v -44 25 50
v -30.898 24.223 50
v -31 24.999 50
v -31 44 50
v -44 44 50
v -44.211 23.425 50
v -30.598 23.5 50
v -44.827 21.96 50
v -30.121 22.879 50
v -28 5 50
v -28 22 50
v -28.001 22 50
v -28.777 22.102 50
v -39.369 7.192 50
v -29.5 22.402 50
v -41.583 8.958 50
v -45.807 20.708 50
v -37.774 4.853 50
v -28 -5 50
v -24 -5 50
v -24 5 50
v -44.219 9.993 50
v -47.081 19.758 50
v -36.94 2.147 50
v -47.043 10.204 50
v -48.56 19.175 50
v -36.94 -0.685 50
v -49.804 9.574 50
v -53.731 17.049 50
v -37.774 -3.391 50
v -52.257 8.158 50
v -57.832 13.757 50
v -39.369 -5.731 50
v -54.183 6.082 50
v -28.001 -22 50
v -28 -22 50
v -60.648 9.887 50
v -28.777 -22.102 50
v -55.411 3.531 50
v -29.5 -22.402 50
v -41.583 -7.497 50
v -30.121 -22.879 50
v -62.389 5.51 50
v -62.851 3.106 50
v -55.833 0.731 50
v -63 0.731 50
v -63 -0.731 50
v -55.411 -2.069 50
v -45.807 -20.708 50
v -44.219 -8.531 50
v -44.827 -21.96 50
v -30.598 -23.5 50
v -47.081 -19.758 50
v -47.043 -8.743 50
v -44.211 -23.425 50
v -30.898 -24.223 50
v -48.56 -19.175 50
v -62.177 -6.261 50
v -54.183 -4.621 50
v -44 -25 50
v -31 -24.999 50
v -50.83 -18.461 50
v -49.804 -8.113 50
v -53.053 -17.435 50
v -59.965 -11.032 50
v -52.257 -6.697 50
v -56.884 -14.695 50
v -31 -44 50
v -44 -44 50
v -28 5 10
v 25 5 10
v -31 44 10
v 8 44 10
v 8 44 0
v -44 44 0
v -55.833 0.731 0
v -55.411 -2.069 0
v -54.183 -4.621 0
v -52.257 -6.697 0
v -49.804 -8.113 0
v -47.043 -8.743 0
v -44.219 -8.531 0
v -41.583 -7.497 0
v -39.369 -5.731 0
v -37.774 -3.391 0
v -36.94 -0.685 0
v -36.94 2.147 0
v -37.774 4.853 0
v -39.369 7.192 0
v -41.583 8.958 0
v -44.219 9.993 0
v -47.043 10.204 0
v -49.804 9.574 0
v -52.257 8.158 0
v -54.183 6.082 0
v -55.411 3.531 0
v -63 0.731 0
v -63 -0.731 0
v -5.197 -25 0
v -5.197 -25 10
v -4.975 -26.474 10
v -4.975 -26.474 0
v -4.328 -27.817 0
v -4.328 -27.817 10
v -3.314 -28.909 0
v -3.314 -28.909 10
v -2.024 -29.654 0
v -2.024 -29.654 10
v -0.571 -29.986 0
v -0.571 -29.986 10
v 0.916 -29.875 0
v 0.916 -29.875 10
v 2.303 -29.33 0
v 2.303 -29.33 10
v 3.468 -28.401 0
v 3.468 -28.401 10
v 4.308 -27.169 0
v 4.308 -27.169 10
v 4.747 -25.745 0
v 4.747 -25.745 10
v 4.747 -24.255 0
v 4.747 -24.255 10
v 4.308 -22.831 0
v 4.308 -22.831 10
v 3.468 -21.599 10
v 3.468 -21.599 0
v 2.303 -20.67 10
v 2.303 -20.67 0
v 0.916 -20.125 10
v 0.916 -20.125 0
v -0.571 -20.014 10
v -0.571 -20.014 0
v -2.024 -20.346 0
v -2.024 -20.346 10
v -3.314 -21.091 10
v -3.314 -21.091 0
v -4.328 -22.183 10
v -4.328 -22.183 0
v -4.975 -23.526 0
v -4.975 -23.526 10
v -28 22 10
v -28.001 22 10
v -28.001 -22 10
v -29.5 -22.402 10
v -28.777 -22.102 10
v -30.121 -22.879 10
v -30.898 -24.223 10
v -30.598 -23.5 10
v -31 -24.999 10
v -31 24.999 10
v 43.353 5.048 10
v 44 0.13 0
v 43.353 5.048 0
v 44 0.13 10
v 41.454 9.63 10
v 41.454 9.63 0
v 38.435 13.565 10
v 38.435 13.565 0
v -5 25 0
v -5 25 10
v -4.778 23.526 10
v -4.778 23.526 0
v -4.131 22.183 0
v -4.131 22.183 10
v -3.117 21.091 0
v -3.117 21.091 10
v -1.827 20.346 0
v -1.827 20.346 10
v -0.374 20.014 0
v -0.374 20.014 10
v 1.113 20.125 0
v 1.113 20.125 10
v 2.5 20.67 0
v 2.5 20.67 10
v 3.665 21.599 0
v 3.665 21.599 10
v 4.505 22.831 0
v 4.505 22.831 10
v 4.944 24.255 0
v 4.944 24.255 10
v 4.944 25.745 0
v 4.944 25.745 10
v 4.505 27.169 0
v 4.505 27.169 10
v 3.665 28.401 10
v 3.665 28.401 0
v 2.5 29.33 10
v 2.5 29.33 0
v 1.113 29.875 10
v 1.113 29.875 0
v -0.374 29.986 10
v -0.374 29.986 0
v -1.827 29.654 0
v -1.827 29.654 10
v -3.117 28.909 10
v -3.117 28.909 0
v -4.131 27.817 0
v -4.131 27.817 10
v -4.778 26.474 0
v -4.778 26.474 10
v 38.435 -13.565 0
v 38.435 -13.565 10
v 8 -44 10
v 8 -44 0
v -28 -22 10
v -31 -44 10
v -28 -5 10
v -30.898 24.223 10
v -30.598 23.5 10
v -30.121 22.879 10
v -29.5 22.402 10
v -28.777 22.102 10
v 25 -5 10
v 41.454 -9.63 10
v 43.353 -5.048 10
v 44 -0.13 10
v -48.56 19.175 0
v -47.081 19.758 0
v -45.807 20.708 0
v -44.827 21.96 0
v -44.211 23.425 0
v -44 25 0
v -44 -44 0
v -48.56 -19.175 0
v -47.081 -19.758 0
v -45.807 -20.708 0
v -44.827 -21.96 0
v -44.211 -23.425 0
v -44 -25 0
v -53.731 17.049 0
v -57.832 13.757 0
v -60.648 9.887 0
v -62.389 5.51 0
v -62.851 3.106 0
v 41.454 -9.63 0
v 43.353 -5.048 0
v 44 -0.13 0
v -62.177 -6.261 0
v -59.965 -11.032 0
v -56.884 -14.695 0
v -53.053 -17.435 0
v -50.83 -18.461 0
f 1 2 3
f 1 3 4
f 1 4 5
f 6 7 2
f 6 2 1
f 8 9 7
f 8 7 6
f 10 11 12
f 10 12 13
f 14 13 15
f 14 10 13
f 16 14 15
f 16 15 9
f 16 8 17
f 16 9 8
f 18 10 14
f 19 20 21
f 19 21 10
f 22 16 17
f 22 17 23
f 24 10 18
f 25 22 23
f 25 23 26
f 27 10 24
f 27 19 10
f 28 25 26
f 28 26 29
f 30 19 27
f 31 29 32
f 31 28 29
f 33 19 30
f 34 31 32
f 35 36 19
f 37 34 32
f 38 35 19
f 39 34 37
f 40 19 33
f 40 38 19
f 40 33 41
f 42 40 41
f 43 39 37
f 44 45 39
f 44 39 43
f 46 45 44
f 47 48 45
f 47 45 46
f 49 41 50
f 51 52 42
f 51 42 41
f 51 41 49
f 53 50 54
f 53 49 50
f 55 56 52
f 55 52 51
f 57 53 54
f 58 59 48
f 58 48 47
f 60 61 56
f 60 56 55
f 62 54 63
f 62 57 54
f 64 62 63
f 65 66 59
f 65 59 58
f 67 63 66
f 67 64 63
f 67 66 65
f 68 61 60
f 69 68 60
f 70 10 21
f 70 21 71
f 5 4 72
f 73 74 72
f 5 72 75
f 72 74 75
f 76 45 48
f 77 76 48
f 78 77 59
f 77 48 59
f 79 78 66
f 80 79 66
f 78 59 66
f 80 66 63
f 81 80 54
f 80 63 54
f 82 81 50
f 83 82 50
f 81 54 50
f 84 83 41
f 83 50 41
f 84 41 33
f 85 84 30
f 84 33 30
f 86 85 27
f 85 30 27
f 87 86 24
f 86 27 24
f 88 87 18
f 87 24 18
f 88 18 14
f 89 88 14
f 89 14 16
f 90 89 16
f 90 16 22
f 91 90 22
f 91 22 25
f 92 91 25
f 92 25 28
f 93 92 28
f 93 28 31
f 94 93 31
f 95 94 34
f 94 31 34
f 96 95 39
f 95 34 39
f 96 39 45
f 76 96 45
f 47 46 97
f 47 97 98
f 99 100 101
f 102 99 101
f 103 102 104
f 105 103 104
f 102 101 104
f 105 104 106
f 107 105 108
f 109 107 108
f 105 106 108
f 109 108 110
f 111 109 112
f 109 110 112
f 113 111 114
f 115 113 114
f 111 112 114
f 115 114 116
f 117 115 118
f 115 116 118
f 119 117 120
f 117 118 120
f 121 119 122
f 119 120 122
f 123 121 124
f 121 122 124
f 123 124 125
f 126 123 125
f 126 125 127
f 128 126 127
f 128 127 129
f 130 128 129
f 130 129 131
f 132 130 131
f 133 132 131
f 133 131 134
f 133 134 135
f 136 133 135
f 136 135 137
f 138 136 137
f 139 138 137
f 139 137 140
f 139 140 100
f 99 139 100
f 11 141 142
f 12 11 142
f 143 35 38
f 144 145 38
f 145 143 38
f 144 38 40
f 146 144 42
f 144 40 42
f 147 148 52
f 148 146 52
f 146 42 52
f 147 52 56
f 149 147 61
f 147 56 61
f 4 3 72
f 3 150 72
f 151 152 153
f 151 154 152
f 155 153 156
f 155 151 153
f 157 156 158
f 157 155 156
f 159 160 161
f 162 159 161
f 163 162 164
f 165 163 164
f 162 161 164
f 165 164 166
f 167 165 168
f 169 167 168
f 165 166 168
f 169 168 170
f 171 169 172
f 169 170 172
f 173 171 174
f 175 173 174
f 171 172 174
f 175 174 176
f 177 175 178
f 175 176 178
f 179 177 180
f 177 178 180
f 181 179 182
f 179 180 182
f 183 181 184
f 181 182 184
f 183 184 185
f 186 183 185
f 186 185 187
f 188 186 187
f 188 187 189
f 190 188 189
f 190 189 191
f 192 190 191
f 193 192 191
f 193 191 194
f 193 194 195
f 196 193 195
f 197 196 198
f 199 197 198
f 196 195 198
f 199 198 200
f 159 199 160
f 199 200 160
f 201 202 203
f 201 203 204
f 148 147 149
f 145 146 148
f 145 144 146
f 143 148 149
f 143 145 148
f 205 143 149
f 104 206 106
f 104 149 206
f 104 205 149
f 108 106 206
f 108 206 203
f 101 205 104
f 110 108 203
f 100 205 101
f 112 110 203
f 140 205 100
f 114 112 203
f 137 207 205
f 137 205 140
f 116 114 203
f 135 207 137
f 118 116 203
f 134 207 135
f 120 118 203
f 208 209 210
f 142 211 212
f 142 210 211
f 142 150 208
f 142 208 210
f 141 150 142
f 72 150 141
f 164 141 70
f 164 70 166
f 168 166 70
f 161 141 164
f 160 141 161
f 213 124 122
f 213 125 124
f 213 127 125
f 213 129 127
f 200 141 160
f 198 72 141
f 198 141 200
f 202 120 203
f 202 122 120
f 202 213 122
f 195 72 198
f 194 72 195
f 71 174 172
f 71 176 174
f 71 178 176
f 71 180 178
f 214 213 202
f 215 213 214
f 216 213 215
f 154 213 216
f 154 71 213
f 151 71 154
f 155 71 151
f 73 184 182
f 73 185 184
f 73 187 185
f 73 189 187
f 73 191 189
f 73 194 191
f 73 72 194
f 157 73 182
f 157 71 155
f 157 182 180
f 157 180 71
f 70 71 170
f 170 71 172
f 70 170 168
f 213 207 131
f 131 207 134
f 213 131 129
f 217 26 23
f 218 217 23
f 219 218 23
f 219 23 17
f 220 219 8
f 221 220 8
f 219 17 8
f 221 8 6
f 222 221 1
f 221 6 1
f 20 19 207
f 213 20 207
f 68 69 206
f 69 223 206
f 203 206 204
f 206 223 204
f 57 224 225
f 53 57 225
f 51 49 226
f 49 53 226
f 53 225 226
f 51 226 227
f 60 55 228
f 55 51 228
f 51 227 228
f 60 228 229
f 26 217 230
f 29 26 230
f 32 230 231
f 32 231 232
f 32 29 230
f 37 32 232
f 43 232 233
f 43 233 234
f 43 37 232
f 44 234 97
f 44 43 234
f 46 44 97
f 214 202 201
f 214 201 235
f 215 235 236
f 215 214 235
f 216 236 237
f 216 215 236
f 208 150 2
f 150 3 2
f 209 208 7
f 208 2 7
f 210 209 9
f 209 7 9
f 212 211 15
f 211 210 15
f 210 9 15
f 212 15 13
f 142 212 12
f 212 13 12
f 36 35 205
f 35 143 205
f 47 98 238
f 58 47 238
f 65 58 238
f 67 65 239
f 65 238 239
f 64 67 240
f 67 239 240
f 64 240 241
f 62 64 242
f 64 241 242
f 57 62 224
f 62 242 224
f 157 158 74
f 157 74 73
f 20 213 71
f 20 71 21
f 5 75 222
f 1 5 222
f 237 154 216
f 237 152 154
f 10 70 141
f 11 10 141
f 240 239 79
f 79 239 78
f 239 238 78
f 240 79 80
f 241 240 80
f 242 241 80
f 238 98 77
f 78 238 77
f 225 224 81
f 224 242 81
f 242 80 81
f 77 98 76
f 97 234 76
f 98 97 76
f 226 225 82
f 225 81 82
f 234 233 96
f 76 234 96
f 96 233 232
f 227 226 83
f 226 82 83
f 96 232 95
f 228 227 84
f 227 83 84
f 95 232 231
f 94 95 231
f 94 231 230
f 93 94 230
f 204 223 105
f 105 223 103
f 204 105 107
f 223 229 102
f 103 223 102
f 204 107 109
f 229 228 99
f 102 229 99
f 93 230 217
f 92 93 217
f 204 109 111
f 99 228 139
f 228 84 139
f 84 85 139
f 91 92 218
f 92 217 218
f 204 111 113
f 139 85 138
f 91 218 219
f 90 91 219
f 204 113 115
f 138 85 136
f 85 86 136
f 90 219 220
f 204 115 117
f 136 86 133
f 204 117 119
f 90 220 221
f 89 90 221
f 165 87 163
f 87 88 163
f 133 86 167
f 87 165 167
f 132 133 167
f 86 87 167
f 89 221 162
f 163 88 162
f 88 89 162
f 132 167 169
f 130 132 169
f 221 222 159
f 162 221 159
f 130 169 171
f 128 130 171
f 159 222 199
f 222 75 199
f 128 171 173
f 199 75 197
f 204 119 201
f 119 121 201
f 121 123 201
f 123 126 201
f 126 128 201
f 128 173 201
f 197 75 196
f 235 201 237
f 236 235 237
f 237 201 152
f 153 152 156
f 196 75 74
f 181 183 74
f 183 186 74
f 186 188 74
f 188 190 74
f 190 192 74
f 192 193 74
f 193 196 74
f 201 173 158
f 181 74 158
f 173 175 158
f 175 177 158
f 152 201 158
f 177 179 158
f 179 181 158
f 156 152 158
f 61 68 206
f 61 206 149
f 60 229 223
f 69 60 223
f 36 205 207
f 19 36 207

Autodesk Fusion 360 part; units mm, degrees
sketch "bottom" plane through (0, 0, 0) normal (0, 0, 1) x (1, 0, 0)
  line L0 (44, -44) -> (-44, -44)
  line L1 (-44, -44) -> (-44, 44)
  line L2 (-44, 44) -> (44, 44)
  line L3 (44, 44) -> (44, -44)
  line L4 (44, -44) -> (-44, 44) construction
  line L5 (-44, -44) -> (44, 44) construction
  dimension "d1" = 88
  dimension "d2" = 88
extrude "Extrude1" add sketch "bottom" along normal blind 10
sketch "Sketch2" plane through (0, 0, 10) normal (0, 0, 1) x (-1, 0, 0)
  line L0 (-44, -44) -> (44, -44)
  line L1 (44, -44) -> (44, 44)
  line L2 (44, 44) -> (-44, 44)
  line L3 (-44, 44) -> (-44, -44)
  line L4 (-44, 0) -> (-25, 0)
  circle A0 centre (-25, 0) radius 19
chamfer "Chamfer1" distance 36 angle 45 2 edges at (44, -44, 5) (44, 44, 5)
fillet "Fillet1" radius 19 2 edges at (44, -8, 5) (44, 8, 5)
sketch "Sketch3" plane through (0, 0, 10) normal (0, 0, 1) x (-1, 0, 0)
  line L0 (44, 44) -> (31, 44)
  line L1 (31, 44) -> (31, -44)
  line L2 (31, -44) -> (44, -44)
  line L3 (44, -44) -> (44, 44)
extrude "Extrude2" add sketch "Sketch3" along normal blind 40
sketch "Sketch4" plane through (0, 0, 10) normal (0, 0, 1) x (-1, 0, 0)
  line L0 (31, -44) -> (31, 44)
  line L1 (31, 44) -> (-8, 44)
  line L2 (-8, 44) -> (-38.435, 13.565)
  arc A0 (-38.435, 13.565) -> (-44, 0.1299) centre (-25, 0.1299) ccw
  line L3 (-44, 0.1299) -> (-44, -0.1299)
  arc A1 (-44, -0.1299) -> (-38.435, -13.565) centre (-25, -0.1299) ccw
  line L4 (-38.435, -13.565) -> (-8, -44)
  line L5 (-8, -44) -> (31, -44)
  line L6 (28, -22) -> (31, -22)
  line L7 (31, -22) -> (31, 22)
  line L8 (31, 22) -> (28, 22)
  line L9 (28, 22) -> (28, -22)
  dimension "d12" = 3
extrude "Extrude3" add sketch "Sketch4" along normal blind 40 contours L0 L6 L7 L8 L9
fillet "Fillet2" radius 3 1 edges at (-31, -22, 30)
fillet "Fillet3" radius 3 1 edges at (-31, 22, 30)
sketch "Sketch6" plane through (0, 0, 0) normal (0, 1, 0) x (1, 0, 0)
  line L0 (-28, -50) -> (-24, -50)
  line L1 (-24, -50) -> (-24, -10)
  line L2 (-24, -10) -> (-28, -10)
  line L3 (-28, -10) -> (-28, -50)
  dimension "d19" = 40
extrude "Extrude4" add sketch "Sketch6" along normal mid plane 10
sketch "triangle" plane through (0, -5, 0) normal (0, -1, 0) x (1, 0, 0)
  line L0 (-28, 50) -> (-28, 10)
  line L1 (-28, 10) -> (-24, 10)
  line L2 (-24, 10) -> (-24, 50)
  line L3 (-24, 50) -> (-28, 50)
  line L4 (-24, 50) -> (-24, 10)
  line L5 (-24, 10) -> (25, 10)
  line L6 (25, 10) -> (-24, 50)
  line L7 (44, 10) -> (25, 10)
  dimension "d26" = 19
  dimension "d28" = 49
extrude "Extrude5" add sketch "triangle" against normal blind 10 contours L2 L4 L5 L6
sketch "the back" plane through (-44, 0, 0) normal (-1, 0, 0) x (0, -1, 0)
  line L0 (-44, 0) -> (44, 0)
  line L1 (44, 0) -> (44, 50)
  line L2 (44, 50) -> (-44, 50)
  line L3 (-44, 50) -> (-44, 0)
  line L4 (-19, 50) -> (19, 50)
  line L5 (19, 50) -> (19, 0)
  line L6 (19, 0) -> (-19, 0)
  line L7 (-19, 0) -> (-19, 50)
extrude "Extrude6" add sketch "the back" along normal blind 19 contours L0 L2 L4 L5 L6 L7
fillet "Fillet4" radius 6 1 edges at (-44, -19, 25)
fillet "Fillet5" radius 6 1 edges at (-44, 19, 25)
fillet "Fillet6" radius 19 2 edges at (-63, 19, 25) (-63, -19, 25)
sketch "wall circle" plane through (0, 0, 50) normal (0, 0, 1) x (-1, 0, 0)
  arc A0 (63, 0.7307) -> (48.56, 19.1754) centre (44, 0.7307) ccw
  arc A1 (44, 25) -> (48.56, 19.1754) centre (50, 25) ccw
  line L0 (44, 25) -> (44, 44)
  line L1 (44, 44) -> (31, 44)
  line L2 (31, 44) -> (31, 25)
  arc A2 (28, 22) -> (31, 25) centre (28, 25) ccw
  line L3 (28, 22) -> (28, 5)
  line L4 (28, 5) -> (24, 5)
  line L5 (24, 5) -> (24, -5)
  line L6 (24, -5) -> (28, -5)
  line L7 (28, -5) -> (28, -22)
  arc A3 (31, -25) -> (28, -22) centre (28, -25) ccw
  line L8 (31, -25) -> (31, -44)
  line L9 (31, -44) -> (44, -44)
  line L10 (44, -44) -> (44, -25)
  arc A4 (48.56, -19.1754) -> (44, -25) centre (50, -25) ccw
  arc A5 (48.56, -19.1754) -> (63, -0.7307) centre (44, -0.7307) ccw
  line L11 (63, -0.7307) -> (63, 0.7307)
  circle A6 centre (46.3334, -0.7307) radius 9.5
  dimension "d37" = 19
extrude "Extrude7" cut sketch "wall circle" against normal blind 50 contours A6
sketch "bottom circles" plane through (0, 0, 10) normal (0, 0, 1) x (-1, 0, 0)
  line L0 (-25, 5) -> (28, 5)
  line L1 (28, 5) -> (28, 22)
  arc A0 (28, 22) -> (31, 25) centre (28, 25) ccw
  line L2 (31, 25) -> (31, 44)
  line L3 (31, 44) -> (-8, 44)
  line L4 (-8, 44) -> (-38.435, 13.565)
  arc A1 (-38.435, 13.565) -> (-44, 0.1299) centre (-25, 0.1299) ccw
  line L5 (-44, 0.1299) -> (-44, -0.1299)
  arc A2 (-44, -0.1299) -> (-38.435, -13.565) centre (-25, -0.1299) ccw
  line L6 (-38.435, -13.565) -> (-8, -44)
  line L7 (-8, -44) -> (31, -44)
  line L8 (31, -44) -> (31, -25)
  arc A3 (31, -25) -> (28, -22) centre (28, -25) ccw
  line L9 (28, -22) -> (28, -5)
  line L10 (28, -5) -> (-25, -5)
  line L11 (-25, -5) -> (-25, 5)
  circle A4 centre (0.1969, 25) radius 5
  circle A5 centre (0, -25) radius 5
  dimension "d43" = 10
  dimension "d44" = 10
extrude "Extrude8" cut sketch "bottom circles" against normal blind 10 contours A4 | A5
